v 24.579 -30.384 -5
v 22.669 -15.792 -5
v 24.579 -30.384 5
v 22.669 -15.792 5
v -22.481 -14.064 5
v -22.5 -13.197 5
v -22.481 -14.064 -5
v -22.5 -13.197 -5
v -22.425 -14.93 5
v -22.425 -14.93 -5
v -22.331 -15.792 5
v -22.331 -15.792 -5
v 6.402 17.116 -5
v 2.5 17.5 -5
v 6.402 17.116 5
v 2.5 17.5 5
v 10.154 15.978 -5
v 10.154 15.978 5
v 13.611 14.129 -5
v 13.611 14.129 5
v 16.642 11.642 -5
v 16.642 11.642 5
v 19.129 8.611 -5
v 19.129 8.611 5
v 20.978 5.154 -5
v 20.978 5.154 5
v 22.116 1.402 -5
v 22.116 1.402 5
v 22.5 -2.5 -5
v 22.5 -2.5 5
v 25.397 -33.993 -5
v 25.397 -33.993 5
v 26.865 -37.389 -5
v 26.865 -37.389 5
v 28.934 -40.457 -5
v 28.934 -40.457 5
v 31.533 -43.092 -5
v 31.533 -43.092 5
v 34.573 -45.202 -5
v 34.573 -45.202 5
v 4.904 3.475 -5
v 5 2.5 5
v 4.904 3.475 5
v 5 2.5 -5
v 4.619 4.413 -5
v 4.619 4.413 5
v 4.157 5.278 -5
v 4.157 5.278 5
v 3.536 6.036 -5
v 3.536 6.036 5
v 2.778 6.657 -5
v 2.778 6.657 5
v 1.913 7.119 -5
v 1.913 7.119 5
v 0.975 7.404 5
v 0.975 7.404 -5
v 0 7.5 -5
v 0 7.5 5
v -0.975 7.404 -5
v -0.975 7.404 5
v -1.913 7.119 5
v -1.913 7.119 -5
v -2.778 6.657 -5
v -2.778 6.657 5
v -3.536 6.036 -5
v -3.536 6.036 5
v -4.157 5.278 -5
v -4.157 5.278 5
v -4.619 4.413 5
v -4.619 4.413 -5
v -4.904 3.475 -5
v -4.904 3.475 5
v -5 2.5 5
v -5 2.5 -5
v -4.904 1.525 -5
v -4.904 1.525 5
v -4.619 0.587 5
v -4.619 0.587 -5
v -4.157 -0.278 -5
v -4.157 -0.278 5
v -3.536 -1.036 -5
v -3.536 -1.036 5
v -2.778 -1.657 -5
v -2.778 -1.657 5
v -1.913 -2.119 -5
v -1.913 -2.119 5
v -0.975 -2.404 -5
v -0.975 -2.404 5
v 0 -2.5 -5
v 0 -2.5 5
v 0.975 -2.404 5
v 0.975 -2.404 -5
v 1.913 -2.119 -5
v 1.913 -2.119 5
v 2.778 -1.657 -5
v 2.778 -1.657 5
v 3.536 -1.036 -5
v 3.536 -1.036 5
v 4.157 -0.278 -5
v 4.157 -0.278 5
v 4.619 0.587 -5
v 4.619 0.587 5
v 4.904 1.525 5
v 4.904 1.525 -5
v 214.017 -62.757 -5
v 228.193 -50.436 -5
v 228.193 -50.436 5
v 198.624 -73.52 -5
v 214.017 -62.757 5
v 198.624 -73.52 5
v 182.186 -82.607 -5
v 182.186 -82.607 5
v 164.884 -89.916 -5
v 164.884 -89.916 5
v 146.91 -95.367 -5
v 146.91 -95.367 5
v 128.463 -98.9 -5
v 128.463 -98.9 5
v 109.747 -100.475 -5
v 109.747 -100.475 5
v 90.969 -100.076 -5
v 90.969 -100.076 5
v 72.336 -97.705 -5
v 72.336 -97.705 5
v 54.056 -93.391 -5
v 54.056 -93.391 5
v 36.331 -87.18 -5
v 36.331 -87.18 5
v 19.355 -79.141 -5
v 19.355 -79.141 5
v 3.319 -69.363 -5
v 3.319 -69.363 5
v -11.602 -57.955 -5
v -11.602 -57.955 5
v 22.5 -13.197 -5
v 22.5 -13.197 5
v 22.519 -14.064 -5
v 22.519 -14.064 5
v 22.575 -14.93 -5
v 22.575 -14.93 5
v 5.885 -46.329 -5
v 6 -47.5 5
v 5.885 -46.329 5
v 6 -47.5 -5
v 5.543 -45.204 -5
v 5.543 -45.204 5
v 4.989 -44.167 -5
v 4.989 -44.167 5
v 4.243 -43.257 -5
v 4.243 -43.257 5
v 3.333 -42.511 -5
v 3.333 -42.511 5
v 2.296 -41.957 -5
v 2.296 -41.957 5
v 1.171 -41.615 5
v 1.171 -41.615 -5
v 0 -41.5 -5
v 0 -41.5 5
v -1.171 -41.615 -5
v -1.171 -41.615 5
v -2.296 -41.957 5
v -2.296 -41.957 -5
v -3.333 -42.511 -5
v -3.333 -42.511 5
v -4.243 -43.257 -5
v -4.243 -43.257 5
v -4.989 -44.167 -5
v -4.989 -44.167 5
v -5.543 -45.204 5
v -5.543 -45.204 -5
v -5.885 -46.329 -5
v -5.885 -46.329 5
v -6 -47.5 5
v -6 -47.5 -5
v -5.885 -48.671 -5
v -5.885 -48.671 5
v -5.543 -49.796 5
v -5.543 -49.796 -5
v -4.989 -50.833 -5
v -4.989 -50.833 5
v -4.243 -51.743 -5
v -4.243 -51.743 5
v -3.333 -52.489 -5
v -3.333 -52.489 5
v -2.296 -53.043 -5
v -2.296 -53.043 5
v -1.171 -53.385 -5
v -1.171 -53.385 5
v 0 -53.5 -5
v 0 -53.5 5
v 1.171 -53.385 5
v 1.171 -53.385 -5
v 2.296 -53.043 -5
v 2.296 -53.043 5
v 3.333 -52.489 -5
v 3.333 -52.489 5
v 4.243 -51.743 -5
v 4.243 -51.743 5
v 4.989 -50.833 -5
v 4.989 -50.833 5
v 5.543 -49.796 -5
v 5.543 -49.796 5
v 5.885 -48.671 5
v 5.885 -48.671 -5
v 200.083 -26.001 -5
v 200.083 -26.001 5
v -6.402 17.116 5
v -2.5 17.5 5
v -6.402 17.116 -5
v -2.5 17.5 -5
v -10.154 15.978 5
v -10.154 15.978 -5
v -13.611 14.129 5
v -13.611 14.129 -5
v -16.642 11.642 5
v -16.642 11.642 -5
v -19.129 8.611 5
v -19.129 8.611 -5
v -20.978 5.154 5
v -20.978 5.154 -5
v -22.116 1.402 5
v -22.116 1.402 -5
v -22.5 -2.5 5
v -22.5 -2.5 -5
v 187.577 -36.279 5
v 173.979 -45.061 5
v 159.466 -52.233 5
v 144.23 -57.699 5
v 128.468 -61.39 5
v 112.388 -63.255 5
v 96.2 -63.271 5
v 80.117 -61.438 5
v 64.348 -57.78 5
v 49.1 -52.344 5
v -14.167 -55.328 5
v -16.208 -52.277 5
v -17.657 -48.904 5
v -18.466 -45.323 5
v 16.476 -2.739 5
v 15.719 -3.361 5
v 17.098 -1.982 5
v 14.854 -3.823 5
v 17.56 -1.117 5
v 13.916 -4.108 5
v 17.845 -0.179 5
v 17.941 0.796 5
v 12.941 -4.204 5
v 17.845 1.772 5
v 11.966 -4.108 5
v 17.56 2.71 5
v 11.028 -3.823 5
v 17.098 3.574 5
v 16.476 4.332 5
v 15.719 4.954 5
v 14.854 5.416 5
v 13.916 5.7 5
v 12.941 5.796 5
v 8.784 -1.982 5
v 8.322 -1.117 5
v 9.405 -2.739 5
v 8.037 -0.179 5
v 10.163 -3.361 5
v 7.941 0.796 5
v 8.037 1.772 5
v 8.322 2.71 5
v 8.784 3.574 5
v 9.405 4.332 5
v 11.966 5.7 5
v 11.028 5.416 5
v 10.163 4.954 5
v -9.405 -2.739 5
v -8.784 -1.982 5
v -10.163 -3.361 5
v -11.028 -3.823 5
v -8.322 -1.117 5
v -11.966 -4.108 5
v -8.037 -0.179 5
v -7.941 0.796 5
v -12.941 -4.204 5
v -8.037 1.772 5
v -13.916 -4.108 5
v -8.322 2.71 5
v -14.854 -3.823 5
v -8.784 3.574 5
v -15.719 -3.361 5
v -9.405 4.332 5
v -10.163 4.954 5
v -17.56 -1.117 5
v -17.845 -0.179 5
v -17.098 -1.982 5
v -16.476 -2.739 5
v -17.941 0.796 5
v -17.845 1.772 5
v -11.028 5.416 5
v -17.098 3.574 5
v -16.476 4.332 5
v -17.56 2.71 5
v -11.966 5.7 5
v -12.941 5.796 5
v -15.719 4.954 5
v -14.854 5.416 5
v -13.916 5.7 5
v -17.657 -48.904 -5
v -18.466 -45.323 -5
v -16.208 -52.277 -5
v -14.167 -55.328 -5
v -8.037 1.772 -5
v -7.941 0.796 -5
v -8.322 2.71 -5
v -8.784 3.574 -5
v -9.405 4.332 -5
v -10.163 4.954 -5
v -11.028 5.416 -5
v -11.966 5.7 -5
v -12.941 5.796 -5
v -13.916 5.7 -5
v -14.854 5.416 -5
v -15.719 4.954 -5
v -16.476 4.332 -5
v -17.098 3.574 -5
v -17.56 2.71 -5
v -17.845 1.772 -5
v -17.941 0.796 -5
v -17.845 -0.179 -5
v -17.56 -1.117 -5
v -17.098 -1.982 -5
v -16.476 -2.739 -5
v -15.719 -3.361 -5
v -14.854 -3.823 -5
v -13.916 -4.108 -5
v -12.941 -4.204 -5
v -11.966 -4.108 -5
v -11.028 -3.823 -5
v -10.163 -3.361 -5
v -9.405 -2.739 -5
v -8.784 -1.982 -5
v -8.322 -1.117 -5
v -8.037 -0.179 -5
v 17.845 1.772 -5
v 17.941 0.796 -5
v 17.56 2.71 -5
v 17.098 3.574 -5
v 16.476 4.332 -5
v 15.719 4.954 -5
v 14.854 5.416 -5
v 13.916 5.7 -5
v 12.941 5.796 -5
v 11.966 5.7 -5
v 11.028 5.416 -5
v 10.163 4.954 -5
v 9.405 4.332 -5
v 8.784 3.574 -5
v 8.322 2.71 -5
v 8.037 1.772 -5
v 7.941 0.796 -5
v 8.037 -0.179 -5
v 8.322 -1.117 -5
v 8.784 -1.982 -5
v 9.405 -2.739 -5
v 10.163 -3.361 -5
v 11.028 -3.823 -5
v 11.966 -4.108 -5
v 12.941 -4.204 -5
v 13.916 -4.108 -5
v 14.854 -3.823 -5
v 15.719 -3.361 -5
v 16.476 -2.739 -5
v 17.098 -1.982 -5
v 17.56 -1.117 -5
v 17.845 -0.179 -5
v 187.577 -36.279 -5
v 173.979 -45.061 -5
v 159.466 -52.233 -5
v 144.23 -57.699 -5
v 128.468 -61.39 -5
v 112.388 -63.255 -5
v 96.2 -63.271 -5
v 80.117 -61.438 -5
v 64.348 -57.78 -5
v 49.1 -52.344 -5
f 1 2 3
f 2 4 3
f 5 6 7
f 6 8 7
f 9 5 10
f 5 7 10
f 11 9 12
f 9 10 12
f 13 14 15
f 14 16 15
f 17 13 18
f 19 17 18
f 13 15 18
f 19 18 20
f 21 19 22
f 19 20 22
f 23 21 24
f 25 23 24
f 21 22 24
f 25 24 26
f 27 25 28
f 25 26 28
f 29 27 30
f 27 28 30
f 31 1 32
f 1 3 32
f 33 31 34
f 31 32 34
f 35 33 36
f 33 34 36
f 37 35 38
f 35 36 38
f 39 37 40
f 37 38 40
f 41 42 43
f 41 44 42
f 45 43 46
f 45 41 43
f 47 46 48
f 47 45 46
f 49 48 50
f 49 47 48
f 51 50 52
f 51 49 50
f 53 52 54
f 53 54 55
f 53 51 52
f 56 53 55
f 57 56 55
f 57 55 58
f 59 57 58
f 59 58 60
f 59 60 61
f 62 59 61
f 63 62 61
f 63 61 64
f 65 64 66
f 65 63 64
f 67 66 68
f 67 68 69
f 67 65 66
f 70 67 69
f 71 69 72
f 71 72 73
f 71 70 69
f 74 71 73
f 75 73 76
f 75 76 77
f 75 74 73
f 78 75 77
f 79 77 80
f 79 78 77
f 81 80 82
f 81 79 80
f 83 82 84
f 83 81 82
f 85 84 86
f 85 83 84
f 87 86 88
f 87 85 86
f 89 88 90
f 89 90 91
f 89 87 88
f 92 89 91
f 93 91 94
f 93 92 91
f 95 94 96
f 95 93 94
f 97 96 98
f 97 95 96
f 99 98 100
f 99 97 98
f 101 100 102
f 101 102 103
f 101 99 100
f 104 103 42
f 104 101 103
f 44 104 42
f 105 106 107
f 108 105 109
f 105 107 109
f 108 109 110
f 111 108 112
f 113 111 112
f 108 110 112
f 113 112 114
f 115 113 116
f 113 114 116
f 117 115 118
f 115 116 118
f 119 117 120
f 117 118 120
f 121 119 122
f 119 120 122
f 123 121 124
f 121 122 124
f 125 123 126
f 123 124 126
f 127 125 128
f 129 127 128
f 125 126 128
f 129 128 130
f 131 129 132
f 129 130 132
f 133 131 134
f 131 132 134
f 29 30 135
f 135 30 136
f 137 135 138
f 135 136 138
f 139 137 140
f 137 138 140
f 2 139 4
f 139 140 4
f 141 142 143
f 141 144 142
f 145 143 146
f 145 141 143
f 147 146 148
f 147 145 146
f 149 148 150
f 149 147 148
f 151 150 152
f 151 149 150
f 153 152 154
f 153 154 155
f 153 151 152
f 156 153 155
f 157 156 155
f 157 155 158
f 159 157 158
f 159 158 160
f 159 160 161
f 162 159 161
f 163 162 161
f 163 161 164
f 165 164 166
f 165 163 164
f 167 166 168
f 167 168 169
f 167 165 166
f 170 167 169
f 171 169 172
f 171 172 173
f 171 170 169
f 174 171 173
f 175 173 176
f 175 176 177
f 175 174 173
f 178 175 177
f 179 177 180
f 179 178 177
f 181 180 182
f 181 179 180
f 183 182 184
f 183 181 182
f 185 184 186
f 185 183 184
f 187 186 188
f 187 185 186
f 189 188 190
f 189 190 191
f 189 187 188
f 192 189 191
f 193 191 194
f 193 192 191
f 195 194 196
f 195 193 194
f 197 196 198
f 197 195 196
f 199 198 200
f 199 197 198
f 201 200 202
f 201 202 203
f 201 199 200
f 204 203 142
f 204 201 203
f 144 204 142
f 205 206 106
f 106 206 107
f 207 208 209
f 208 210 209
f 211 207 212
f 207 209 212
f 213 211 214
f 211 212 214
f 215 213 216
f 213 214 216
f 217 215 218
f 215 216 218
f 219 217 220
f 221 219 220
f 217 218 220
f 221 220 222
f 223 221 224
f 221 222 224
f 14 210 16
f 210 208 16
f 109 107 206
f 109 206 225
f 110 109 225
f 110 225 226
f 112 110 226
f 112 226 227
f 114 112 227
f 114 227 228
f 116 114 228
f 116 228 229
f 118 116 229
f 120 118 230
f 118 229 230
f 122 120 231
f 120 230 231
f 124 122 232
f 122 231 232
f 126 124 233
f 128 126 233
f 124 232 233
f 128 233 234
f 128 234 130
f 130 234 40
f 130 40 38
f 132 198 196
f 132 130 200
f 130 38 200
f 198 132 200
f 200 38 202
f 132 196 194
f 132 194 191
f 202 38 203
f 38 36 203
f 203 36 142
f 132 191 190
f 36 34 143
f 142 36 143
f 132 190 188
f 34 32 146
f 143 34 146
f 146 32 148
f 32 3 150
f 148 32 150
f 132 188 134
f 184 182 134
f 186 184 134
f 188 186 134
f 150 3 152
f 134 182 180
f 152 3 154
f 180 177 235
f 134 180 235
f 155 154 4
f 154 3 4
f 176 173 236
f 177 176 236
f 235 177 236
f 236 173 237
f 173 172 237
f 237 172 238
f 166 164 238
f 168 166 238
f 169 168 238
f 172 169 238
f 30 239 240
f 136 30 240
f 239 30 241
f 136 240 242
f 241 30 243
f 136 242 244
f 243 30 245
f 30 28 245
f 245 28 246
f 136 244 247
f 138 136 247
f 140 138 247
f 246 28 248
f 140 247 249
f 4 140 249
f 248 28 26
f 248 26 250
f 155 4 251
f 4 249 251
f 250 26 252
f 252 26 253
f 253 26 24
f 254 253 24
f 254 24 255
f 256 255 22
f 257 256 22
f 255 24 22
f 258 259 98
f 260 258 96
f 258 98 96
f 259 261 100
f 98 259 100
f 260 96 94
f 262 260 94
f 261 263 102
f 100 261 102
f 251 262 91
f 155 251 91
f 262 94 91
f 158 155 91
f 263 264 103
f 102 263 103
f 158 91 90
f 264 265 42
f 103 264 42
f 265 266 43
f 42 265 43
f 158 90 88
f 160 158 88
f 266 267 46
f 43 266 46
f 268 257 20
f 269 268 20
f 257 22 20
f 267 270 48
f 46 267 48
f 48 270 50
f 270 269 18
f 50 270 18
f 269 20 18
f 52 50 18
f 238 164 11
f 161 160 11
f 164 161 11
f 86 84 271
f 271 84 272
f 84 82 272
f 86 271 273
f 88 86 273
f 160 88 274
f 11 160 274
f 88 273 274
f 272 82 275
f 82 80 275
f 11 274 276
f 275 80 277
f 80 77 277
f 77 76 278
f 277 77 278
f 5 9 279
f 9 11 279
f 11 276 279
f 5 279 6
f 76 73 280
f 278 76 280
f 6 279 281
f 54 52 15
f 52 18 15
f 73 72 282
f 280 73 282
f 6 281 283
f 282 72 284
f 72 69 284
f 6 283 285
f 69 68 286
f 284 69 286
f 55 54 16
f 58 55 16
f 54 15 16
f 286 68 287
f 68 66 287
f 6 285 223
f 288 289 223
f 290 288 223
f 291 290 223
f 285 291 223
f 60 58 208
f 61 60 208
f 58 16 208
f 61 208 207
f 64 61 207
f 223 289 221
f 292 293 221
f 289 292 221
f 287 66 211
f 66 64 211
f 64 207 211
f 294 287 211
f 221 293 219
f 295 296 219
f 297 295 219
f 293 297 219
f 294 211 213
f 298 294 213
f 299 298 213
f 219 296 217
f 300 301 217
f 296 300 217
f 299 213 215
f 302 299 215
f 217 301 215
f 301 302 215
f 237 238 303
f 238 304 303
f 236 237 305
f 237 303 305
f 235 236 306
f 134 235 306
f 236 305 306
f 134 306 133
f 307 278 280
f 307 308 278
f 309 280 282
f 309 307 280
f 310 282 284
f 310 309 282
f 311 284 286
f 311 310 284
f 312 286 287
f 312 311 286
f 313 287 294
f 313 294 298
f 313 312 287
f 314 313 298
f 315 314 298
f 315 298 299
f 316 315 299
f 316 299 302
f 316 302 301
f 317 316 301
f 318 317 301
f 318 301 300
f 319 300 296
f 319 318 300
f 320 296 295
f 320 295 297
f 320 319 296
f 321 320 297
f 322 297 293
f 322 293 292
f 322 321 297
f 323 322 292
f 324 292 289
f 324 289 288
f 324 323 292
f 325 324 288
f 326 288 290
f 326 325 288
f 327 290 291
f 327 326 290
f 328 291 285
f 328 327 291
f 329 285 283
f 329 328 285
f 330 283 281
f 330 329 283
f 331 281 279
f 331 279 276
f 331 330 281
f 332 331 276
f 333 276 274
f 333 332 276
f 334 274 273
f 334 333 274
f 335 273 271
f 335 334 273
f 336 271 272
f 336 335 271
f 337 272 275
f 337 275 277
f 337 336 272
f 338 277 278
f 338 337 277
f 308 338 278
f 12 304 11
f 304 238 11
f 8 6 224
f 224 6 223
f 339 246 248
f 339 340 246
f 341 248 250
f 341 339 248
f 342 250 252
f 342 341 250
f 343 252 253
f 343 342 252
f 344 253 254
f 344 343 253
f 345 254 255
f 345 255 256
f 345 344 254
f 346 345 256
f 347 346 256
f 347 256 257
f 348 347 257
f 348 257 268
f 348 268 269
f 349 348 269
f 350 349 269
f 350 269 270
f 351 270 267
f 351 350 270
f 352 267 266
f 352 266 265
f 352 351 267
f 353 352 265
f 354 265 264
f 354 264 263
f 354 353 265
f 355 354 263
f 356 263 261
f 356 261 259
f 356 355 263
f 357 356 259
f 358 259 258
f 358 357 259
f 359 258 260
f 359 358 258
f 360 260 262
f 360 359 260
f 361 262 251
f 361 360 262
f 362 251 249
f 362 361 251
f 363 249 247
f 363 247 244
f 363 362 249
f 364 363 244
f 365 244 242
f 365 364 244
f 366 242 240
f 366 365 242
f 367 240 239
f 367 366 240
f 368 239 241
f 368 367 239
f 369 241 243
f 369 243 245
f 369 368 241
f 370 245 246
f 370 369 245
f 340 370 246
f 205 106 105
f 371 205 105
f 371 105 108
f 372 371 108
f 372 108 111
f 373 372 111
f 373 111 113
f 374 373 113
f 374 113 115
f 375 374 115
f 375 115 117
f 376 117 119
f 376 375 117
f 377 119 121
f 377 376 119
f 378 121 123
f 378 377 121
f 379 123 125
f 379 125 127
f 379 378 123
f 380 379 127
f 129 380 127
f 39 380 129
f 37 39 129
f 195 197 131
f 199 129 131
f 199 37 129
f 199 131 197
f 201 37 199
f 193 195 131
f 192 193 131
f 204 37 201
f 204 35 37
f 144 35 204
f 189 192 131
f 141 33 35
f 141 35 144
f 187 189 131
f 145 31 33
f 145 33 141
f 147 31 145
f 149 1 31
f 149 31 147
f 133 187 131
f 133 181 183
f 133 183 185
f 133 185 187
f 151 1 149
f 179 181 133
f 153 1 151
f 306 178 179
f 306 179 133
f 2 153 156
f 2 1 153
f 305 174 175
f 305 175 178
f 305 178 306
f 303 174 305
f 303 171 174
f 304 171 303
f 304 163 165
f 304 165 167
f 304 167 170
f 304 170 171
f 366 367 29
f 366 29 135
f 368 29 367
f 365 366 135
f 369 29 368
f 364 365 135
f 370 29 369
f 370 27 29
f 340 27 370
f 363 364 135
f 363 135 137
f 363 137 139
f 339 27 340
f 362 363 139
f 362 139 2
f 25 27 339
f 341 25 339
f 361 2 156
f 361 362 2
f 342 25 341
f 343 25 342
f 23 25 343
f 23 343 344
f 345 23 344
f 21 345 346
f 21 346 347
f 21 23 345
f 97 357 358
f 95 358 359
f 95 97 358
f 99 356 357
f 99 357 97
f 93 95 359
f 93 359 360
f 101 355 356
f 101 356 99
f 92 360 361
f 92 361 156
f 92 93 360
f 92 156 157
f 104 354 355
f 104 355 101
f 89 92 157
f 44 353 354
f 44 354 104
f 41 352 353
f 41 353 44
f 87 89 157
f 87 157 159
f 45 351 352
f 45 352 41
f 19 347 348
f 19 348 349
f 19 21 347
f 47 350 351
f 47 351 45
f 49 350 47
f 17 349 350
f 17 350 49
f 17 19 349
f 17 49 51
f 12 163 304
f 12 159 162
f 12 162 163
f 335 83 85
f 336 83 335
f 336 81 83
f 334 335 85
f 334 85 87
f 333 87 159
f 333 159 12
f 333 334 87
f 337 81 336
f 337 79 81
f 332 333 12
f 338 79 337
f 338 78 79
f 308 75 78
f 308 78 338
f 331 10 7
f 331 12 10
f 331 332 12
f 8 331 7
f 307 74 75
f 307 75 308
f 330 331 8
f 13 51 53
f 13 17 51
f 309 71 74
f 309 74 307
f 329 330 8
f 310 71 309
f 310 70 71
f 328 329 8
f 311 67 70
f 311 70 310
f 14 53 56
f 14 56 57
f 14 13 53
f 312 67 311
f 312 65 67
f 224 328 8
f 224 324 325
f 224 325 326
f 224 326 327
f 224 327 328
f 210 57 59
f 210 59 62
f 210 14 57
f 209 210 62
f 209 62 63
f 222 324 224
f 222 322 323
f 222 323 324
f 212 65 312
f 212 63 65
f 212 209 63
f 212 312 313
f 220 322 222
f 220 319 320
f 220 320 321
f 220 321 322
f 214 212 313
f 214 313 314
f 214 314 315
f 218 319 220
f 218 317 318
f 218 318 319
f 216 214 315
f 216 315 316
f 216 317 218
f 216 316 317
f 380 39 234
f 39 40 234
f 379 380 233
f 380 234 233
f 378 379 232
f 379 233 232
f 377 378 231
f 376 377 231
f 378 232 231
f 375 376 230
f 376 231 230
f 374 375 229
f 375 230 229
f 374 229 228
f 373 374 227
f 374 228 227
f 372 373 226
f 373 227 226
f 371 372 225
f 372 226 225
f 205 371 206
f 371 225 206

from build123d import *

# Parameters (mm, degrees)
ESQUISSE1_R        = 6
ESQUISSE1_R_2      = 5
BOSS_EXTRU_1_DEPTH = 5
CONG_1_R           = 20


with BuildPart() as part:
    # Esquisse1 → Boss.-Extru.1 (new body, symmetric)
    with BuildSketch(Plane.XY):
        with BuildLine():
            Line((200.083196535, -26.00073282), (228.193277133, -50.436453083))
            ThreePointArc((228.193277133, -50.436453083), (105.798406768, -100.555368837), (-17.5, -52.702334489))
            Line((-17.5, -52.702334489), (-22.5, -14.5))
            Line((-22.5, -14.5), (-22.5, 17.5))
            Line((-22.5, 17.5), (22.5, 17.5))
            Line((22.5, 17.5), (22.5, -14.5))
            Line((22.5, -14.5), (25.81470592, -39.825900861))
            ThreePointArc((25.81470592, -39.825900861), (115.339933121, -63.052032289), (200.083196535, -26.00073282))
        make_face()
        with Locations((0, -47.5)):
            Circle(ESQUISSE1_R, mode=Mode.SUBTRACT)
        with Locations((-12.940952255, 0.796291314)):
            Circle(ESQUISSE1_R_2, mode=Mode.SUBTRACT)
        with Locations((0, 2.5)):
            Circle(ESQUISSE1_R_2, mode=Mode.SUBTRACT)
        with Locations((12.940952255, 0.796291314)):
            Circle(ESQUISSE1_R_2, mode=Mode.SUBTRACT)
    extrude(amount=BOSS_EXTRU_1_DEPTH, both=True)

    # Congé1
    cong_1_edges = [part.edges().sort_by_distance(p)[0] for p in [
        (-17.5, -52.702334489, 0),
        (-22.5, -14.5, 0),
        (-22.5, 17.5, 0),
        (22.5, 17.5, 0),
        (22.5, -14.5, 0),
        (25.81470592, -39.825900861, 0),
    ]]
    fillet(cong_1_edges, radius=CONG_1_R)


solid = part.part
